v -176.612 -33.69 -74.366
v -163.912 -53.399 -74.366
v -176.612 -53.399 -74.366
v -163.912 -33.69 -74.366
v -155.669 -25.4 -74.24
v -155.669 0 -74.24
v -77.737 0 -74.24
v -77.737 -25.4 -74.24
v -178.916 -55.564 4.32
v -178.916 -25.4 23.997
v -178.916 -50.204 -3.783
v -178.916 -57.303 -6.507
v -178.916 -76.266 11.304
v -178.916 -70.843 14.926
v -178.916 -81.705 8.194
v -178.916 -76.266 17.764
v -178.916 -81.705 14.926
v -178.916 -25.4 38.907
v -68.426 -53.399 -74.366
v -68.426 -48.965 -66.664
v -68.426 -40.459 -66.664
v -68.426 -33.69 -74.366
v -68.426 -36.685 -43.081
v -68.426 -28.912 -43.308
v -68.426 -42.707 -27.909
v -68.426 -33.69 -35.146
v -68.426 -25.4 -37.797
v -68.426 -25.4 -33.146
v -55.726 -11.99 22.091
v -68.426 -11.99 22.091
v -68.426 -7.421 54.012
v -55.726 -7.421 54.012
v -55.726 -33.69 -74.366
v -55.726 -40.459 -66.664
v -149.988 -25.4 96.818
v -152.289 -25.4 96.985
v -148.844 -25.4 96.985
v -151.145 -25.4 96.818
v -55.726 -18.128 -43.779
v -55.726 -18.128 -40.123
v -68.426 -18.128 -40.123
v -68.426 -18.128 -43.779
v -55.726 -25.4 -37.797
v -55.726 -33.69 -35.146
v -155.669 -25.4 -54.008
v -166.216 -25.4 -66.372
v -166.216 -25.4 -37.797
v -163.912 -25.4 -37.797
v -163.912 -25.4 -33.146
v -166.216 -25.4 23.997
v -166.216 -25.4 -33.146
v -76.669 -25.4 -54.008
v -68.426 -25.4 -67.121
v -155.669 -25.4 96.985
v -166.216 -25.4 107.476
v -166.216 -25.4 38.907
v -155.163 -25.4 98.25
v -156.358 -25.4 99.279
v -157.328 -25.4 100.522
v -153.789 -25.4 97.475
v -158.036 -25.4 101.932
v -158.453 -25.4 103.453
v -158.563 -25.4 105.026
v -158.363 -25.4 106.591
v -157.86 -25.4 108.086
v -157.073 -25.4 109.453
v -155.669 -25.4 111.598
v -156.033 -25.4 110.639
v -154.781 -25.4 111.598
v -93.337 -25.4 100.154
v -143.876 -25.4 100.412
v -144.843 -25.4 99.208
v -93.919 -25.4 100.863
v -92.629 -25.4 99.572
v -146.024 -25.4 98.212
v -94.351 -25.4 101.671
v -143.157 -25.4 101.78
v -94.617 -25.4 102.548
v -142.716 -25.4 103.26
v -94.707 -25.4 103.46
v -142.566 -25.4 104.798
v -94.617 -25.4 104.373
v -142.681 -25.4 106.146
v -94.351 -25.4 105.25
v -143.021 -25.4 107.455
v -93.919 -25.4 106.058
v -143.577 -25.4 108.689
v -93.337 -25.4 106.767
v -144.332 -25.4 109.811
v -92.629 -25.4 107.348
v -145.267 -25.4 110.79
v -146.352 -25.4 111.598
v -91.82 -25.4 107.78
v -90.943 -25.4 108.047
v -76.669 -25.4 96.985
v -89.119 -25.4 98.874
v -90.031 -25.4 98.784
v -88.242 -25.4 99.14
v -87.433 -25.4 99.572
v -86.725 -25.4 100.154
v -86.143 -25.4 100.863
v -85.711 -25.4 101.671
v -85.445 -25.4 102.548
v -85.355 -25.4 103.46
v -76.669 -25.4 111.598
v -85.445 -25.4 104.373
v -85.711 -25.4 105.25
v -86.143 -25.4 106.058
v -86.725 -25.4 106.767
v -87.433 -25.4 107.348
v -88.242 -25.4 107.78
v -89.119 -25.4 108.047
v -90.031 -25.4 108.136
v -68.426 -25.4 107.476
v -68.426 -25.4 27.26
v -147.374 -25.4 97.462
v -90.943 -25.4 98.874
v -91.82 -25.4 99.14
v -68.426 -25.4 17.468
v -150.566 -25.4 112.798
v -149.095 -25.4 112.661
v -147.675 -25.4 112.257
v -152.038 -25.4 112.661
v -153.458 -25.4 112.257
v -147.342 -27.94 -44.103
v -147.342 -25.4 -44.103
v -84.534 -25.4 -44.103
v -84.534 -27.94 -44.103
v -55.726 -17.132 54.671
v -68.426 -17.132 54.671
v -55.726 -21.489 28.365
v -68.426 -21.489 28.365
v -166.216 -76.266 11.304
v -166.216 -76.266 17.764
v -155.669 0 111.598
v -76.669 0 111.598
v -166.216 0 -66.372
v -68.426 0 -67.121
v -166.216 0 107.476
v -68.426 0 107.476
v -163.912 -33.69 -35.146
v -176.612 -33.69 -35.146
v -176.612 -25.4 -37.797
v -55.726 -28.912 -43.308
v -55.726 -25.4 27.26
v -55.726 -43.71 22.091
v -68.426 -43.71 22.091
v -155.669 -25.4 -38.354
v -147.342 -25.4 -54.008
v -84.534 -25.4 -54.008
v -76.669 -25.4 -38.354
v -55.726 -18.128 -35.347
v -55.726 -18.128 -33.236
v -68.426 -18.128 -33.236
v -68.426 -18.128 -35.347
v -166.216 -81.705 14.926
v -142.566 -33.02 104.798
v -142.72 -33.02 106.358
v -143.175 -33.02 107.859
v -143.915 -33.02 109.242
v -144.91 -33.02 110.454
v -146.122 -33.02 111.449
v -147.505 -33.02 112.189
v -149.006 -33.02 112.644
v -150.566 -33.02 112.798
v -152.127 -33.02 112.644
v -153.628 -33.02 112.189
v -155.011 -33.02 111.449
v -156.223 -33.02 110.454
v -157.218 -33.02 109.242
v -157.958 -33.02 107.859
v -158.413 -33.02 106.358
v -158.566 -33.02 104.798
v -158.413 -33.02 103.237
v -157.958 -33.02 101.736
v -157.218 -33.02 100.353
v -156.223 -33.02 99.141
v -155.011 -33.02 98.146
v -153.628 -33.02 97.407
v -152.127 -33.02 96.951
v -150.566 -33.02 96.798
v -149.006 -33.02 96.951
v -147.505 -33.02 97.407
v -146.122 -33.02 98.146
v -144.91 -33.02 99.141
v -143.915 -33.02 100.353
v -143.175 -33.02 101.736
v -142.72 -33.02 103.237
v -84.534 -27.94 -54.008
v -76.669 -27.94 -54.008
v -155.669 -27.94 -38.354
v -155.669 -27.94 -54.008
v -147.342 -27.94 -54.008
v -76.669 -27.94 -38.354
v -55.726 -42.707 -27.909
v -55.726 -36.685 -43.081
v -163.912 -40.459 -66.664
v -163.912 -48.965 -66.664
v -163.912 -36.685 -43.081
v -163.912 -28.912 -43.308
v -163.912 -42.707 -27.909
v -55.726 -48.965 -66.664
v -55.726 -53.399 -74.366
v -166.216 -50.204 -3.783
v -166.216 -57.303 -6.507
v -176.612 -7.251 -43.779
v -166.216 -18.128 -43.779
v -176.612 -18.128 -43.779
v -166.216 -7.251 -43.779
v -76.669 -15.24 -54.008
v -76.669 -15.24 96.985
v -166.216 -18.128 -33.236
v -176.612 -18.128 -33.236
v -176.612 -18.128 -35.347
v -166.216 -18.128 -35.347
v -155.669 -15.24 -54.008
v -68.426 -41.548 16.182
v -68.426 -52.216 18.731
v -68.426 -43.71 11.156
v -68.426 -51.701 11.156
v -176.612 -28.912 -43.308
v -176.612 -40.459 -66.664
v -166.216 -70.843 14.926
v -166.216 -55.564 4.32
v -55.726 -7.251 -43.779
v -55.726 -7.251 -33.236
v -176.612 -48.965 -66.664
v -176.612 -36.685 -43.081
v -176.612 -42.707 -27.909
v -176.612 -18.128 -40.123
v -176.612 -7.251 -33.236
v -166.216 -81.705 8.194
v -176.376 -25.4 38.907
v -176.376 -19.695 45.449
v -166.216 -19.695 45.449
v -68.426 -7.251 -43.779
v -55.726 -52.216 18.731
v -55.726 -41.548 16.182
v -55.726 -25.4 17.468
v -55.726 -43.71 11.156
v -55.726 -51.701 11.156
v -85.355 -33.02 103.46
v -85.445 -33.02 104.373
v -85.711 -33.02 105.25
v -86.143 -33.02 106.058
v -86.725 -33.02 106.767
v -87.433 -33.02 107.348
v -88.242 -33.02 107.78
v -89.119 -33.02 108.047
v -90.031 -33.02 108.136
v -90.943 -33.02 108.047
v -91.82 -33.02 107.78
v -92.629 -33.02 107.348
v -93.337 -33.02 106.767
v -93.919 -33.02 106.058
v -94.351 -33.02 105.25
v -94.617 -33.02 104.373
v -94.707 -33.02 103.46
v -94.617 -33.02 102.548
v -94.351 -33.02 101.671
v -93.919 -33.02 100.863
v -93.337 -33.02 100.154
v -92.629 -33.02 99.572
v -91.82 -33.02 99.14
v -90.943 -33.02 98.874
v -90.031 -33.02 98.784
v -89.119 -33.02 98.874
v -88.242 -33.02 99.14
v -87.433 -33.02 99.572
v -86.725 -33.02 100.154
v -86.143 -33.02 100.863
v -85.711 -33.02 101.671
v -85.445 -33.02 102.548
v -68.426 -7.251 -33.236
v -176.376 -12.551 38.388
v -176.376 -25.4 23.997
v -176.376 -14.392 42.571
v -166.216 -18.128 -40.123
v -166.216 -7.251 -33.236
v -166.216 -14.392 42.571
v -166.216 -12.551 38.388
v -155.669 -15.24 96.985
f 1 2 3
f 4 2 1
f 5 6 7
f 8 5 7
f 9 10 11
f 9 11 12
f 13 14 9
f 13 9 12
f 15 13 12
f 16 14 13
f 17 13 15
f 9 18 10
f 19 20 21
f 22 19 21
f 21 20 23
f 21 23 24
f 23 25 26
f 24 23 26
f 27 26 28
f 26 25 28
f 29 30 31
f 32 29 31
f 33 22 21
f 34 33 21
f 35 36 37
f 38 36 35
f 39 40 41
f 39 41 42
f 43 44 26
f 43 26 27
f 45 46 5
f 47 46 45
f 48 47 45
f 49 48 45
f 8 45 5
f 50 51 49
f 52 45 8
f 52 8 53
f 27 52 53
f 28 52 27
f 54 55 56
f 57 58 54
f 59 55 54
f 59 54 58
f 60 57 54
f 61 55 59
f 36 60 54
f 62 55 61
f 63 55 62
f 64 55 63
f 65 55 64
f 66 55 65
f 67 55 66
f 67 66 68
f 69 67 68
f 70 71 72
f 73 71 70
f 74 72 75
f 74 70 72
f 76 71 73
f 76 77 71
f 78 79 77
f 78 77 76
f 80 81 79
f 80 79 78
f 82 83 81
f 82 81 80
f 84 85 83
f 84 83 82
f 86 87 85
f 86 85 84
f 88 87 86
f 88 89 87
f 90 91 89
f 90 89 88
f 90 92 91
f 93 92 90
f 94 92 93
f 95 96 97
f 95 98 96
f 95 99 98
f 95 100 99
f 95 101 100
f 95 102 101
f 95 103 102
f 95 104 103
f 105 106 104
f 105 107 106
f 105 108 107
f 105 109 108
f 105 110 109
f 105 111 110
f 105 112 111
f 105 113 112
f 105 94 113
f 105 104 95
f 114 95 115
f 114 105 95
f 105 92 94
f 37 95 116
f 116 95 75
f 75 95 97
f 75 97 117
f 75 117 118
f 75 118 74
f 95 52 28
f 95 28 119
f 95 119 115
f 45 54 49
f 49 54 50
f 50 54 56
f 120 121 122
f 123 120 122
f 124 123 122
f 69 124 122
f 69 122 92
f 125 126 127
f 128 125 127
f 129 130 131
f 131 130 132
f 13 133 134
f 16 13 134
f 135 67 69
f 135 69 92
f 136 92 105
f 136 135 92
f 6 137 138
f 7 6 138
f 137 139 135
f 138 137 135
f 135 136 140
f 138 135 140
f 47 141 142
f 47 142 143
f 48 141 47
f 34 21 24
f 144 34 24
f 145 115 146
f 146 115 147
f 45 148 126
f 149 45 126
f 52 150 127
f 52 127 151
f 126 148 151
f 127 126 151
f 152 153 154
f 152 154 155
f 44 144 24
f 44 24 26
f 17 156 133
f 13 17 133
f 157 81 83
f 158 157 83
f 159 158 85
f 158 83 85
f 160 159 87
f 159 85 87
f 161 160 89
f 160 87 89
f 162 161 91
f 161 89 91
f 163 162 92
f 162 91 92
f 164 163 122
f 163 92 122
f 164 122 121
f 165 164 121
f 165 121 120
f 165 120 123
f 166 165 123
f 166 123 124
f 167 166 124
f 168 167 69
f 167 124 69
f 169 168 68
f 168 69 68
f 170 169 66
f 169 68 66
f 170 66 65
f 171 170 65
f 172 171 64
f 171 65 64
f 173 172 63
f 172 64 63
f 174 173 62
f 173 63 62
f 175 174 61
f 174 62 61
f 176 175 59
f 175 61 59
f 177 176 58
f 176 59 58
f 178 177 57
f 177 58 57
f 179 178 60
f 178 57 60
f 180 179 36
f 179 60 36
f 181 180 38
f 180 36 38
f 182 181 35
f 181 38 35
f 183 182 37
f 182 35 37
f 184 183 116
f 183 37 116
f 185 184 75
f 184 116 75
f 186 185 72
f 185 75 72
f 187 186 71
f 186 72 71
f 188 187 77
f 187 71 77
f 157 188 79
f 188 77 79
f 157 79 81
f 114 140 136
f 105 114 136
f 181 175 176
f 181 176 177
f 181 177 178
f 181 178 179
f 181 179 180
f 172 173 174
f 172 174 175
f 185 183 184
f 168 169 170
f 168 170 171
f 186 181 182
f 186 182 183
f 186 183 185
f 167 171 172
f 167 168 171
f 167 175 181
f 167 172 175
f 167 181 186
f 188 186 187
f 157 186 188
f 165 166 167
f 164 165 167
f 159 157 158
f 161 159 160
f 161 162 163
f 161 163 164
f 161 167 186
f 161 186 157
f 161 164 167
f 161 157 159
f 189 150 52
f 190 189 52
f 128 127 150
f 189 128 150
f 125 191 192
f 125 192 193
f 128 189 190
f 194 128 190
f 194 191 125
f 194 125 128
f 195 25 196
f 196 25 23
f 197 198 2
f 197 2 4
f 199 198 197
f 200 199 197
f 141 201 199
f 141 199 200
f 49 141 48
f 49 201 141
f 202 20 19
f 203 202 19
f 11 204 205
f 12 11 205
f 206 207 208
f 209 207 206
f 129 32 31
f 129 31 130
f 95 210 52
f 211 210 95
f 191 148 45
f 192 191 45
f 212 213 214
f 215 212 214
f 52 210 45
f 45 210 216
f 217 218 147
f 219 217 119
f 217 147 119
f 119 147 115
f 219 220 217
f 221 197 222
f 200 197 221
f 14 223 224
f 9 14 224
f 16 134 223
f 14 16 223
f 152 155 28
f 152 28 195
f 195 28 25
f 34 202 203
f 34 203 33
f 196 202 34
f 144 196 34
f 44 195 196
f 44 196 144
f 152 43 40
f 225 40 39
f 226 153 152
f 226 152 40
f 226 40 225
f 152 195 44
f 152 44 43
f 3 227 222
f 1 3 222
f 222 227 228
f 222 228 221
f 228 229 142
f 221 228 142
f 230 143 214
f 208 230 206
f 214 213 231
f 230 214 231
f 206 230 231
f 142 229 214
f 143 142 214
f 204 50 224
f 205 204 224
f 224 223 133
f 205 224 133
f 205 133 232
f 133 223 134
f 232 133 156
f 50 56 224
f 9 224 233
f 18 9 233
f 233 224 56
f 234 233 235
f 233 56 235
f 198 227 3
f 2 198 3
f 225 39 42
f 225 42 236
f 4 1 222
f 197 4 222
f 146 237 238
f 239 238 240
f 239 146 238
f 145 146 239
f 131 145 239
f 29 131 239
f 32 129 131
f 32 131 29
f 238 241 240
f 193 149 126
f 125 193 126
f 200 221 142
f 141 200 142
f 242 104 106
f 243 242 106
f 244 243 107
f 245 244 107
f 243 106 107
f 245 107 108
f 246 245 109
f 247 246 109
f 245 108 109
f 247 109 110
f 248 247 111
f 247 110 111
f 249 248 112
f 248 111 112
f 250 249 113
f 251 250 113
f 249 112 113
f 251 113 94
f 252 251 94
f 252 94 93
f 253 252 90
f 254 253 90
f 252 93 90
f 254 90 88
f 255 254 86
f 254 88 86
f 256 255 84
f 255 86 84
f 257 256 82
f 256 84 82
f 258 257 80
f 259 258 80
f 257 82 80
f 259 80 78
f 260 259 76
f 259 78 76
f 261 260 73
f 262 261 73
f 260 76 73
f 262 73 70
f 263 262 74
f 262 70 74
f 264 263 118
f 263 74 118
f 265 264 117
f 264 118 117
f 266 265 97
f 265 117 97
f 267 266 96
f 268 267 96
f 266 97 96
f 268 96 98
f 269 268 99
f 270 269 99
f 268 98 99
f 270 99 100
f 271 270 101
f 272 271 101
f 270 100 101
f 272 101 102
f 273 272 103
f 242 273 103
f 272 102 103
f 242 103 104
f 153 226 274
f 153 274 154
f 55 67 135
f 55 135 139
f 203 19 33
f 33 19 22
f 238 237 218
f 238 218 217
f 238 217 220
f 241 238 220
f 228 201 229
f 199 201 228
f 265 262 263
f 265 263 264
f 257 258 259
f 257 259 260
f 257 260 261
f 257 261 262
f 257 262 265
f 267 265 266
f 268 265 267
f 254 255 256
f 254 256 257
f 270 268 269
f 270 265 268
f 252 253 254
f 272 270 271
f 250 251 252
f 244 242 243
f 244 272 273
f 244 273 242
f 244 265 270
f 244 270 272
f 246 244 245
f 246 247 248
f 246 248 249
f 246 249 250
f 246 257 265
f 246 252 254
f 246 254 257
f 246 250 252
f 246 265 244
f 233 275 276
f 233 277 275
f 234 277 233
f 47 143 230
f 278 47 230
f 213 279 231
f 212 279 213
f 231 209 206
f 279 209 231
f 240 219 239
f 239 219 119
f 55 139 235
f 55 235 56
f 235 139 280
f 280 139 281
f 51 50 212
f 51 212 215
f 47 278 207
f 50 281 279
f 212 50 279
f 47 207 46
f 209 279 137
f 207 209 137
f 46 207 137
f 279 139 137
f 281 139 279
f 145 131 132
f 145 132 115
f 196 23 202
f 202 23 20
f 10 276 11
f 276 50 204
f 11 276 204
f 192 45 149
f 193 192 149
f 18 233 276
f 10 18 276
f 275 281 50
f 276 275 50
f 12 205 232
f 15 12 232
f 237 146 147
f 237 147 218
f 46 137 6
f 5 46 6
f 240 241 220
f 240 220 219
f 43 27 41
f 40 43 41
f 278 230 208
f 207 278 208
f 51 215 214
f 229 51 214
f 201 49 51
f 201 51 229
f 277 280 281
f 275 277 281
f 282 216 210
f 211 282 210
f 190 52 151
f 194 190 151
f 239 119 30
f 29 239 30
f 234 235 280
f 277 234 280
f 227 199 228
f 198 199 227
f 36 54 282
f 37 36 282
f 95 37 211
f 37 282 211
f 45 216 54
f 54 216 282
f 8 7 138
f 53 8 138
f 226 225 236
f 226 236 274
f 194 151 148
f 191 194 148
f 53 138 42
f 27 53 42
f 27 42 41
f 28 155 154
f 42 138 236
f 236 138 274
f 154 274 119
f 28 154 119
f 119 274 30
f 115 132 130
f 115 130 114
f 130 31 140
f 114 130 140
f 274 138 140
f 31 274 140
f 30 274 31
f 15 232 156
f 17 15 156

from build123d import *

# Parameters (mm, degrees)
F0_W      = 79
F0_H      = 150.9931944311
F1_DEPTH  = 15.24
F0_W_2    = 8.242815733
F0_H_2    = 14.6122574806
F0_W_3    = 10.5468220115
F2_DEPTH  = 25.4
F3_W      = 8.3270930648
F3_H      = 9.9045075476
F4_DEPTH  = 2.54
F5_R      = 8
F5_R_2    = 4.6759862525
F6_DEPTH  = 7.62
F8_DEPTH  = 10.16
F10_DEPTH = 12.7
F11_DEPTH = 12.7
F13_DEPTH = 12.7


# Not quite as in the source:
# - a pattern or mirror of a feature is missing from the dataset's text; its kind, count and spacing are read off the source's solid
# - a feature names something its author has since deleted; it is built from what else it names


with BuildPart() as f1:
    # F0 (on Front) → F1 (new body)
    with BuildSketch(Plane.XZ):
        with Locations((-116.1688212752, 21.4886832982)):
            Rectangle(F0_W, F0_H)
    extrude(amount=F1_DEPTH)

    # F0 (on Front) → F2 (join)
    with BuildSketch(Plane.XZ):
        with Locations((-72.5474134088, 21.4886832982)):
            Rectangle(F0_W_2, F0_H)
        with Locations((-116.1688212752, 104.2914092541)):
            Rectangle(F0_W, F0_H_2)
        Polygon((-76.6688212752, 111.5975379944), (-76.6688212752, 96.9852805138), (-68.4260055423, 96.9852805138), (-68.4260055423, 107.4761226773), align=None)
        Polygon((-77.7368583679, -74.2402523756), (-76.6688212752, -54.0079139173), (-155.6688212752, -54.0079139173), (-155.6688212752, -74.2402523756), align=None)
        Polygon((-68.4260055423, -54.0079139173), (-76.6688212752, -54.0079139173), (-77.7368583679, -74.2402523756), (-68.4260055423, -67.1214684844), align=None)
        with Locations((-160.942232281, 21.4886832982)):
            Rectangle(F0_W_3, F0_H)
        Polygon((-166.2156432867, 96.9852805138), (-155.6688212752, 96.9852805138), (-155.6688212752, 111.5975379944), (-166.2156432867, 107.4761226773), align=None)
        Polygon((-155.6688212752, -74.2402523756), (-155.6688212752, -54.0079139173), (-166.2156432867, -54.0079139173), (-166.2156432867, -66.3721188903), align=None)
    extrude(amount=F2_DEPTH)

    # F5 (on face) → F6 (join)
    with BuildSketch(Plane.XZ.offset(25.4)):
        with Locations((-150.5664885044, 104.7975379944)):
            Circle(F5_R)
        with Locations((-90.0309309363, 103.4603789449)):
            Circle(F5_R_2)
    extrude(amount=F6_DEPTH)

    # F7 (on face) → F8 (join)
    with BuildSketch(Plane(origin=(-166.2156432867, 0, 0), x_dir=(0, -1, 0), z_dir=(-1, 0, 0))):
        Polygon((12.5508932397, 38.3876636624), (25.4, 23.9966639606), (25.4, 38.9068748126), (19.6947995573, 45.4485118389), (14.391691424, 42.5712950528), align=None)
    extrude(amount=F8_DEPTH)

    # F9 (on face) → F10 (join)
    with BuildSketch(Plane.YZ.offset(-68.4260055423)):
        Polygon((-25.4, -37.796987619), (-25.4, -33.1461169376), (-42.7074283361, -27.9086306691), (-36.6851389408, -43.0811978877), (-48.9648841321, -66.6637793183), (-53.3993802965, -74.3656232953), (-33.6898453534, -74.3656232953), (-40.4587760568, -66.6637793183), (-28.9117768407, -43.3081761003), (-33.6898453534, -35.1456440985), align=None)
        Polygon((-18.1280039251, -40.1227921247), (-18.1280039251, -35.3467315435), (-25.4, -33.1461169376), (-25.4, -37.796987619), align=None)
        Polygon((-7.2505627759, -33.2361012697), (-18.1280039251, -33.2361012697), (-18.1280039251, -35.3467315435), (-18.1280039251, -40.1227921247), (-18.1280039251, -43.778847903), (-7.2505627759, -43.778847903), align=None)
    f10 = extrude(amount=F10_DEPTH)

    # F10_copies: F10 across plane
    add(f10.mirror(Plane(origin=(-116.168821, 0, 0), x_dir=(0, 0, -1), z_dir=(-1, 0, 0))))

    # F7 (on face) → F11 (join)
    with BuildSketch(Plane(origin=(-166.2156432867, 0, 0), x_dir=(0, -1, 0), z_dir=(-1, 0, 0))):
        Polygon((25.4, 23.9966639606), (50.2035729587, -3.7833380047), (57.3032200336, -6.5071620047), (81.7048251629, 8.1935711205), (81.7048251629, 14.9255720899), (76.265707612, 11.3043896854), (76.265707612, 17.763774842), (70.8431079984, 14.9255720899), (55.5642731488, 4.3202326633), (25.4, 38.9068748126), align=None)
    extrude(amount=F11_DEPTH)

    # F12 (on face) → F13 (join)
    with BuildSketch(Plane.YZ.offset(-68.4260055423)):
        Polygon((-25.4, 17.4681073426), (-25.4, 27.2602735729), (-43.7104962766, 22.0907106996), (-52.2158779204, 18.7307391316), (-41.5477119386, 16.1824021488), (-51.7014451325, 11.1562022939), (-43.7104962766, 11.1562022939), align=None)
        Polygon((-7.4211359024, 54.0121272206), (-17.1320363879, 54.6712055802), (-21.4885137975, 28.3645950258), (-25.4, 27.2602735729), (-25.4, 17.4681073426), (-11.9900768623, 22.0907106996), align=None)
    extrude(amount=F13_DEPTH)


with BuildPart() as f4:
    # F3 (on face) → F4 (new body)
    with BuildSketch(Plane.XZ.offset(25.4)):
        Polygon((-76.6688212752, -44.1034063697), (-76.6688212752, -38.3540131152), (-155.6688212752, -38.3540131152), (-155.6688212752, -44.1034063697), (-147.3417282104, -44.1034063697), (-84.5337882638, -44.1034063697), align=None)
        Polygon((-76.6688212752, -54.0079139173), (-76.6688212752, -44.1034063697), (-84.5337882638, -44.1034063697), (-84.5337882638, -54.0079139173), (-81.2943726778, -54.0079139173), align=None)
        with Locations((-151.5052747428, -49.0556601435)):
            Rectangle(F3_W, F3_H)
    extrude(amount=F4_DEPTH)


solid = Compound([f1.part, f4.part])
